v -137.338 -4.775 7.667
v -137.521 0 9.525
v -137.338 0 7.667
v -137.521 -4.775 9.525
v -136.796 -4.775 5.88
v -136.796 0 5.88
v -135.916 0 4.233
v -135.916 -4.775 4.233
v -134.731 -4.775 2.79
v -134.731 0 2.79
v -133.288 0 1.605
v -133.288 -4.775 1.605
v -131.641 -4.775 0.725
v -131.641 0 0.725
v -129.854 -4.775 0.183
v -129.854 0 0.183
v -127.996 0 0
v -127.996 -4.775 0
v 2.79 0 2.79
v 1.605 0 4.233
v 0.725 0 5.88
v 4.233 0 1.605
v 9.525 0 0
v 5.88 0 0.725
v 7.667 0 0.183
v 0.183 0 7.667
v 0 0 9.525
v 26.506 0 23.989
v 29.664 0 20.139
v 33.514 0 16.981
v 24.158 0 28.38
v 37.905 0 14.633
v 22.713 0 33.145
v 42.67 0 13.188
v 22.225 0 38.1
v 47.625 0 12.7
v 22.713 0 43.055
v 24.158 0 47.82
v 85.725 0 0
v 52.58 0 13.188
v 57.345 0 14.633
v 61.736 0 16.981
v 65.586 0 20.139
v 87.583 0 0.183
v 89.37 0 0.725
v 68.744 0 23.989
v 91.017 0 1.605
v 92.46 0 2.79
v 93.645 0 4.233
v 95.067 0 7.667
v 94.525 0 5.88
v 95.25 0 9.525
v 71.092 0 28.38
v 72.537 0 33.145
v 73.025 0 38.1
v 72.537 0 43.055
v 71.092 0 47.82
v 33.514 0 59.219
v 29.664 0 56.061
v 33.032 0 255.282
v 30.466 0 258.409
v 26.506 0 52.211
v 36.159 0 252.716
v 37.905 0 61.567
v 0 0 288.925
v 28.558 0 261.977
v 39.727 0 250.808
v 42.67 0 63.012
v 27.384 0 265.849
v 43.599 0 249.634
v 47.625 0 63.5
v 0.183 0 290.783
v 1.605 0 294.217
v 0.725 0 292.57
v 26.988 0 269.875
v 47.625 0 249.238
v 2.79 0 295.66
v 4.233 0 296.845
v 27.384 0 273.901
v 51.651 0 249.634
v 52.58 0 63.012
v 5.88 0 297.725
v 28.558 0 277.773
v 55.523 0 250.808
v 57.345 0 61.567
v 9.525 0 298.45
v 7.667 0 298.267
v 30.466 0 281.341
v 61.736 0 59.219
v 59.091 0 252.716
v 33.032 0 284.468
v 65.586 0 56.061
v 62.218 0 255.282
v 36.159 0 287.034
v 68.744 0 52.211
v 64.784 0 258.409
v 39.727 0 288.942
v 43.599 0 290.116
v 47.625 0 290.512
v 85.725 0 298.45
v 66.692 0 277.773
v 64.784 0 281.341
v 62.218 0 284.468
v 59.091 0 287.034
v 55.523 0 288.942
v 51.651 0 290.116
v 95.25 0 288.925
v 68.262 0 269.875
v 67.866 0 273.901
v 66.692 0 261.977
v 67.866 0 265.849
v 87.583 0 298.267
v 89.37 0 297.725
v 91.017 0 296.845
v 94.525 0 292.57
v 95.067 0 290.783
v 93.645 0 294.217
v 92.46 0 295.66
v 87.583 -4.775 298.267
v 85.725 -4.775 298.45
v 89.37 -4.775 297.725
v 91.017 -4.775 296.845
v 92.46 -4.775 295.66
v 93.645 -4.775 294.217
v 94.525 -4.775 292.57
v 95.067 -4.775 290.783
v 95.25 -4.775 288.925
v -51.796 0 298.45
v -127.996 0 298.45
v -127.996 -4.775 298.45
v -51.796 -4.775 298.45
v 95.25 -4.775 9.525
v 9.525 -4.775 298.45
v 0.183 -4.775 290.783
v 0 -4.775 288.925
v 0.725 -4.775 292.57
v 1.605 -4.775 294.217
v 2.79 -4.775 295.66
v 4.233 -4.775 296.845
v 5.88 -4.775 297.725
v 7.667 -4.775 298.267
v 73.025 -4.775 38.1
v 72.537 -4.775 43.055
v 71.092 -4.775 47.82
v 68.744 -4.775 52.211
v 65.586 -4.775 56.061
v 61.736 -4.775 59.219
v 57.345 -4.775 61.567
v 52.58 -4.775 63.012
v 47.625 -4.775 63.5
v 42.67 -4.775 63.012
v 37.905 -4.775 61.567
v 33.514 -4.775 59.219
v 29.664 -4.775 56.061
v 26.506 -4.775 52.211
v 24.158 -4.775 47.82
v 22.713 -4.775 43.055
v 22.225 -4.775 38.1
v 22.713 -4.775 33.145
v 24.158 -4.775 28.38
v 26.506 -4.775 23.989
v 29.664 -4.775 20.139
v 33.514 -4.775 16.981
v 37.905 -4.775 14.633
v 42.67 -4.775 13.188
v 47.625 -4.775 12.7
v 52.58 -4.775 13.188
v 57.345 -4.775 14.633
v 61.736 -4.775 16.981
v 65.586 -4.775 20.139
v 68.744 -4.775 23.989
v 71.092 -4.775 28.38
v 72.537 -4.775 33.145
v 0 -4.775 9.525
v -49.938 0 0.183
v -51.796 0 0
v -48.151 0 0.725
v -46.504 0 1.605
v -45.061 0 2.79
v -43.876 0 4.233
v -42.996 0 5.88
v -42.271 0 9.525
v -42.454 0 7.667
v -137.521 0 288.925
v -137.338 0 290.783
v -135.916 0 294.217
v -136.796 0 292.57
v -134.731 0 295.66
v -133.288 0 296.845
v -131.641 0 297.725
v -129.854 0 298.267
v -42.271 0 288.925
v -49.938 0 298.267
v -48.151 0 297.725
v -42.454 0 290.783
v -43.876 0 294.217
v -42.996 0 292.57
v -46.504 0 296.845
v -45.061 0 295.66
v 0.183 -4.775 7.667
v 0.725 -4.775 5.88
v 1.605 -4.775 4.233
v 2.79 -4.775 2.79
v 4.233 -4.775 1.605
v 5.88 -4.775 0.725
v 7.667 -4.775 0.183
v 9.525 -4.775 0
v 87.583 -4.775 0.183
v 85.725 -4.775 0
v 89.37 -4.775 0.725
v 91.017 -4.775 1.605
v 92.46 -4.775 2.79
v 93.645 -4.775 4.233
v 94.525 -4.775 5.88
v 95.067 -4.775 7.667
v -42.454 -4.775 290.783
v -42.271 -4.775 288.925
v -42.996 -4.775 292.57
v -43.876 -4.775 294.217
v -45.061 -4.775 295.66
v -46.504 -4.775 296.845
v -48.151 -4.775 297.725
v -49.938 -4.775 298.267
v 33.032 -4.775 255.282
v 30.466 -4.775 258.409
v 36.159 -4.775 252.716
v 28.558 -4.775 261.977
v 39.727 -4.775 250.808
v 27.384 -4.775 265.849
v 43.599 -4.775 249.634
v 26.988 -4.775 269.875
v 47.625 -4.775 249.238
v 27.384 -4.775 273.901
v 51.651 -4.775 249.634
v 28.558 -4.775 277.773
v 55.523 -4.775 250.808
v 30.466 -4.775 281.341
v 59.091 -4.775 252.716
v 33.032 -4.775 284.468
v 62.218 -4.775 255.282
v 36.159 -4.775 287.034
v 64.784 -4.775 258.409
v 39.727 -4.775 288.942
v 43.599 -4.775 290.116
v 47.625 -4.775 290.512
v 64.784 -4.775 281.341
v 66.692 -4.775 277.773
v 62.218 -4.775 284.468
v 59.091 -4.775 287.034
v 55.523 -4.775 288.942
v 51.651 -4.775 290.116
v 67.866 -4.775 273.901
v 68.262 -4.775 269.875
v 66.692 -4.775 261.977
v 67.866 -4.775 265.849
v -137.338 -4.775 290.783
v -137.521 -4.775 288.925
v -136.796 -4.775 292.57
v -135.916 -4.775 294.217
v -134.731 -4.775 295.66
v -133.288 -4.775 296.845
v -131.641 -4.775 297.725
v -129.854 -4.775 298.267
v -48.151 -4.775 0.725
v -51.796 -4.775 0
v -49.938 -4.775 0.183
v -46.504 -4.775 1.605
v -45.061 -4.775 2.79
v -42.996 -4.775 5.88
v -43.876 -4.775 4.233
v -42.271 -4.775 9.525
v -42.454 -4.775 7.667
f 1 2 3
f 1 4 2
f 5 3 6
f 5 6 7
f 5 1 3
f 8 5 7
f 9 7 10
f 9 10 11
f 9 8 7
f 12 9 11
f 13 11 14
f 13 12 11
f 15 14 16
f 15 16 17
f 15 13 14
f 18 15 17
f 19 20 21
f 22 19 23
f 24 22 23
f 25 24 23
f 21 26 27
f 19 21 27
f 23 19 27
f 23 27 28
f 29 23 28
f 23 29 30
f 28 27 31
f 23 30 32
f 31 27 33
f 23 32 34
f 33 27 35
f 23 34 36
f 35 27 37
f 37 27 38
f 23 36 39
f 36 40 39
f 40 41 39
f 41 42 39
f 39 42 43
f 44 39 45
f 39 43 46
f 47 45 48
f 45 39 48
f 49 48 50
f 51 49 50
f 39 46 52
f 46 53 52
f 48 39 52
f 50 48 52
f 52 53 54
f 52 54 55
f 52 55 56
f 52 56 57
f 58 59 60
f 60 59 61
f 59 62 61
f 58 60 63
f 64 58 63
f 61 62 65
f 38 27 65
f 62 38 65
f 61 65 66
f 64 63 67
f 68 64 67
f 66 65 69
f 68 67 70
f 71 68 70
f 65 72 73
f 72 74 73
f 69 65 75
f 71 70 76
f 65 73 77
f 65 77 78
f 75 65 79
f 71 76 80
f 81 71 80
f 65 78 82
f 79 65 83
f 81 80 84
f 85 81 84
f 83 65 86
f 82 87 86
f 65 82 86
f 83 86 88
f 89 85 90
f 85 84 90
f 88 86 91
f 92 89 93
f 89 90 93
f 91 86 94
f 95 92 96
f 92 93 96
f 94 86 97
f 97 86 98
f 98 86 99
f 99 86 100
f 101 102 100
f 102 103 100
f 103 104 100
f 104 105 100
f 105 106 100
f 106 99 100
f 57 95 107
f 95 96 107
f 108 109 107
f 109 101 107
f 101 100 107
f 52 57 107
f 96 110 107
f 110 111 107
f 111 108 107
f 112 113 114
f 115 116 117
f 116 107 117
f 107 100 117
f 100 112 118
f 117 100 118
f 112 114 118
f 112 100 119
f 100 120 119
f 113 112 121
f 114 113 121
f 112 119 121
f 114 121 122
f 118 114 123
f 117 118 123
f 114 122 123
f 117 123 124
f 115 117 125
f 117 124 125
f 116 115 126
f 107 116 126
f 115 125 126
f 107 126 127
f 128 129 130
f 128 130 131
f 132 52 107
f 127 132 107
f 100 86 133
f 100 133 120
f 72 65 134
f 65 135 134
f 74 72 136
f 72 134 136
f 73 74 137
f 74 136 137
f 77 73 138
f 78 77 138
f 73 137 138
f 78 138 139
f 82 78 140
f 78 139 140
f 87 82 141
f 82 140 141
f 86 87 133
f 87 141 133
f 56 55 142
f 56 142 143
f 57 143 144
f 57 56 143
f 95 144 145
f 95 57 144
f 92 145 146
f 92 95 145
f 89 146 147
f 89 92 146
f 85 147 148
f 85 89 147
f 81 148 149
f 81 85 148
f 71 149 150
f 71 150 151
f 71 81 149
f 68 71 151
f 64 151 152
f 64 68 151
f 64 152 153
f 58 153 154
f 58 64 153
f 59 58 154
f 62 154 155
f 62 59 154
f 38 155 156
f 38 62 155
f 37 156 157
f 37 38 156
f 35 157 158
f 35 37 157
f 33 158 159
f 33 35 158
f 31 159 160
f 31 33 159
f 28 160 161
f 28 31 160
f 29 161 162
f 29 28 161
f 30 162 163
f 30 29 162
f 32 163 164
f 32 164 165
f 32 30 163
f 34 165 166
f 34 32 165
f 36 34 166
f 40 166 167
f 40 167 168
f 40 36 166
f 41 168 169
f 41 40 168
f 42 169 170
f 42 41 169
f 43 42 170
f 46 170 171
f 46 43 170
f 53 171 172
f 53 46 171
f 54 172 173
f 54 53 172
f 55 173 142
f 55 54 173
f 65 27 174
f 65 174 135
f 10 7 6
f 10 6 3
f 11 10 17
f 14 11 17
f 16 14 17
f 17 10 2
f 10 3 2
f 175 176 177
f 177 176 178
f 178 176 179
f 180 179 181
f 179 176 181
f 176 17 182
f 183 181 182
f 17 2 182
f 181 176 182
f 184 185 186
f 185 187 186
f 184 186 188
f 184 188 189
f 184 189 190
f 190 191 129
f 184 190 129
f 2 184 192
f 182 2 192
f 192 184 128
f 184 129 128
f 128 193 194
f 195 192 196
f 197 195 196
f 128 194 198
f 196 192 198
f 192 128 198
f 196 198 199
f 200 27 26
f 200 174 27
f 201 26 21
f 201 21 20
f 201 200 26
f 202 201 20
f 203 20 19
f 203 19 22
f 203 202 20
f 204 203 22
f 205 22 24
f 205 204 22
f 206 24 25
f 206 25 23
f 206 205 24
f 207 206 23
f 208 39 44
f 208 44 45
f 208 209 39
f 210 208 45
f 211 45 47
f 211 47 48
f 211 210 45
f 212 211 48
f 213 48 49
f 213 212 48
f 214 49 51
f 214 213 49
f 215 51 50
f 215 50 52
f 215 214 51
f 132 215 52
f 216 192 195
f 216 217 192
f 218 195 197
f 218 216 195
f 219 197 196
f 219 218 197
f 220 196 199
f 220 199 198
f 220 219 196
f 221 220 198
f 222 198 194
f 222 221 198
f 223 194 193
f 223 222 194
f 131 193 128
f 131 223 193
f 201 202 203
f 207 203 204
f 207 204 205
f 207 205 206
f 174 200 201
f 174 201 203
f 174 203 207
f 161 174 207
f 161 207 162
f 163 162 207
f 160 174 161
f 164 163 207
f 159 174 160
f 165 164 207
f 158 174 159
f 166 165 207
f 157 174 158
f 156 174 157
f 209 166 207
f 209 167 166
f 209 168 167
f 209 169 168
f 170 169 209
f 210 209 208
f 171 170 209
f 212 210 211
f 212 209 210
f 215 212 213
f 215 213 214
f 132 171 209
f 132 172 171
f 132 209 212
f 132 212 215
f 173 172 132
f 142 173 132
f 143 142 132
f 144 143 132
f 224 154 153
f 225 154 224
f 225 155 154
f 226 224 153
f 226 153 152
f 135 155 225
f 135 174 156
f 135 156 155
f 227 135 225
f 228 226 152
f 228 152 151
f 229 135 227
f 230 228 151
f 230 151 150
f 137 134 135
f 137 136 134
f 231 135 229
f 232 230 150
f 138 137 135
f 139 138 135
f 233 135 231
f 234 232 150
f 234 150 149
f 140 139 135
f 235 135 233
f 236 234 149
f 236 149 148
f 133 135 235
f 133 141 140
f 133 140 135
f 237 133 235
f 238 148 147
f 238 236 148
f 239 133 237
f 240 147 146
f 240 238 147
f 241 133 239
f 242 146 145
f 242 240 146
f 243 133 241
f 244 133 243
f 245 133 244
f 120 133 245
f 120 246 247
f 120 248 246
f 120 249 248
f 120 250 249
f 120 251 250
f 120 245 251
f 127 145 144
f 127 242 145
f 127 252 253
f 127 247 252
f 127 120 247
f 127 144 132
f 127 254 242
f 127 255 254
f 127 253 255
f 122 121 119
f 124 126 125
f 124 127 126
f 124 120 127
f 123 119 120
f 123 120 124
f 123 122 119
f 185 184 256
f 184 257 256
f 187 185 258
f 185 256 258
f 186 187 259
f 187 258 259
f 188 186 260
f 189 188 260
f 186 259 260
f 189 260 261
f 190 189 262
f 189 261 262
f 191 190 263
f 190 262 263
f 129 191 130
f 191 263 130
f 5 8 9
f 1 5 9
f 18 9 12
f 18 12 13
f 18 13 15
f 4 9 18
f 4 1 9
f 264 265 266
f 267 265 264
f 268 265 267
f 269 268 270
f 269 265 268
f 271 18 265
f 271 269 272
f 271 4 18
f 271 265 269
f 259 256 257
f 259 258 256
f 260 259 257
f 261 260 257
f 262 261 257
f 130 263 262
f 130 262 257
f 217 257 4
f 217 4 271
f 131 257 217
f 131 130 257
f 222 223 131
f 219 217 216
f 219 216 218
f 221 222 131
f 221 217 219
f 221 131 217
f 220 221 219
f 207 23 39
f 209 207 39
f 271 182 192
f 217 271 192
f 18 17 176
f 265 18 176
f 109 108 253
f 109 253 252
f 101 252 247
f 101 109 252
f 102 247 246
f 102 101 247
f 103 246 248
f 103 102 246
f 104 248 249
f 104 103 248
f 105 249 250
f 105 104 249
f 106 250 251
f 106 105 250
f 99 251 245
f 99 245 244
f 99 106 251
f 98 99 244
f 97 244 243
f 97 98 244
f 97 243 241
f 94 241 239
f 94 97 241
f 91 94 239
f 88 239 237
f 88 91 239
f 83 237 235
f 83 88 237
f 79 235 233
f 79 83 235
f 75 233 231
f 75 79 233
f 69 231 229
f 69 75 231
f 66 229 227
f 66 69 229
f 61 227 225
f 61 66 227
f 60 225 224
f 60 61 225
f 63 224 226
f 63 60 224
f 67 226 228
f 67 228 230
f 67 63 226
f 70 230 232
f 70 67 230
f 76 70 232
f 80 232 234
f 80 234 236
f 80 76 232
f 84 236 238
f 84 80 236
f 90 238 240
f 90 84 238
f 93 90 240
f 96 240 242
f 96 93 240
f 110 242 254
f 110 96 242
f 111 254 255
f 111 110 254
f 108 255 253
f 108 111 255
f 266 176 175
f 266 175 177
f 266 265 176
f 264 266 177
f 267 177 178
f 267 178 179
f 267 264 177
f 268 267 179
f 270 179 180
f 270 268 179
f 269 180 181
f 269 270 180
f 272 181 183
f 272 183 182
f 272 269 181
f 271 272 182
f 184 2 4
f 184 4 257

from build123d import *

# Parameters (mm, degrees)
F0_W     = 95.25
F0_H     = 298.45
F0_R     = 25.4
F0_R_2   = 20.6375
F1_DEPTH = 4.7752
F2_R     = 9.525
F3_W     = 95.25
F3_H     = 298.45
F4_DEPTH = 4.7752
F5_R     = 9.525


with BuildPart() as f1:
    # F0 (on Front) → F1 (new body)
    with BuildSketch(Plane.XZ):
        with Locations((47.625, 149.225)):
            Rectangle(F0_W, F0_H)
        with Locations((47.625, 38.1)):
            Circle(F0_R, mode=Mode.SUBTRACT)
        with Locations((47.625, 269.875)):
            Circle(F0_R_2, mode=Mode.SUBTRACT)
    extrude(amount=F1_DEPTH)

    # F2
    f2_edges = [f1.edges().sort_by_distance(p)[0] for p in [
        (0, -2.3876, 298.45),
        (95.25, -2.3876, 298.45),
        (0, -2.3876, 0),
        (95.25, -2.3876, 0),
    ]]
    fillet(f2_edges, radius=F2_R)


with BuildPart() as f4:
    # F3 (on Front) → F4 (new body)
    with BuildSketch(Plane.XZ):
        with Locations((-89.895899, 149.225)):
            Rectangle(F3_W, F3_H)
    extrude(amount=F4_DEPTH)

    # F5
    f5_edges = [f4.edges().sort_by_distance(p)[0] for p in [
        (-137.520899, -2.3876, 298.45),
        (-42.270899, -2.3876, 298.45),
        (-42.270899, -2.3876, 0),
        (-137.520899, -2.3876, 0),
    ]]
    fillet(f5_edges, radius=F5_R)


solid = Compound([f1.part, f4.part])
